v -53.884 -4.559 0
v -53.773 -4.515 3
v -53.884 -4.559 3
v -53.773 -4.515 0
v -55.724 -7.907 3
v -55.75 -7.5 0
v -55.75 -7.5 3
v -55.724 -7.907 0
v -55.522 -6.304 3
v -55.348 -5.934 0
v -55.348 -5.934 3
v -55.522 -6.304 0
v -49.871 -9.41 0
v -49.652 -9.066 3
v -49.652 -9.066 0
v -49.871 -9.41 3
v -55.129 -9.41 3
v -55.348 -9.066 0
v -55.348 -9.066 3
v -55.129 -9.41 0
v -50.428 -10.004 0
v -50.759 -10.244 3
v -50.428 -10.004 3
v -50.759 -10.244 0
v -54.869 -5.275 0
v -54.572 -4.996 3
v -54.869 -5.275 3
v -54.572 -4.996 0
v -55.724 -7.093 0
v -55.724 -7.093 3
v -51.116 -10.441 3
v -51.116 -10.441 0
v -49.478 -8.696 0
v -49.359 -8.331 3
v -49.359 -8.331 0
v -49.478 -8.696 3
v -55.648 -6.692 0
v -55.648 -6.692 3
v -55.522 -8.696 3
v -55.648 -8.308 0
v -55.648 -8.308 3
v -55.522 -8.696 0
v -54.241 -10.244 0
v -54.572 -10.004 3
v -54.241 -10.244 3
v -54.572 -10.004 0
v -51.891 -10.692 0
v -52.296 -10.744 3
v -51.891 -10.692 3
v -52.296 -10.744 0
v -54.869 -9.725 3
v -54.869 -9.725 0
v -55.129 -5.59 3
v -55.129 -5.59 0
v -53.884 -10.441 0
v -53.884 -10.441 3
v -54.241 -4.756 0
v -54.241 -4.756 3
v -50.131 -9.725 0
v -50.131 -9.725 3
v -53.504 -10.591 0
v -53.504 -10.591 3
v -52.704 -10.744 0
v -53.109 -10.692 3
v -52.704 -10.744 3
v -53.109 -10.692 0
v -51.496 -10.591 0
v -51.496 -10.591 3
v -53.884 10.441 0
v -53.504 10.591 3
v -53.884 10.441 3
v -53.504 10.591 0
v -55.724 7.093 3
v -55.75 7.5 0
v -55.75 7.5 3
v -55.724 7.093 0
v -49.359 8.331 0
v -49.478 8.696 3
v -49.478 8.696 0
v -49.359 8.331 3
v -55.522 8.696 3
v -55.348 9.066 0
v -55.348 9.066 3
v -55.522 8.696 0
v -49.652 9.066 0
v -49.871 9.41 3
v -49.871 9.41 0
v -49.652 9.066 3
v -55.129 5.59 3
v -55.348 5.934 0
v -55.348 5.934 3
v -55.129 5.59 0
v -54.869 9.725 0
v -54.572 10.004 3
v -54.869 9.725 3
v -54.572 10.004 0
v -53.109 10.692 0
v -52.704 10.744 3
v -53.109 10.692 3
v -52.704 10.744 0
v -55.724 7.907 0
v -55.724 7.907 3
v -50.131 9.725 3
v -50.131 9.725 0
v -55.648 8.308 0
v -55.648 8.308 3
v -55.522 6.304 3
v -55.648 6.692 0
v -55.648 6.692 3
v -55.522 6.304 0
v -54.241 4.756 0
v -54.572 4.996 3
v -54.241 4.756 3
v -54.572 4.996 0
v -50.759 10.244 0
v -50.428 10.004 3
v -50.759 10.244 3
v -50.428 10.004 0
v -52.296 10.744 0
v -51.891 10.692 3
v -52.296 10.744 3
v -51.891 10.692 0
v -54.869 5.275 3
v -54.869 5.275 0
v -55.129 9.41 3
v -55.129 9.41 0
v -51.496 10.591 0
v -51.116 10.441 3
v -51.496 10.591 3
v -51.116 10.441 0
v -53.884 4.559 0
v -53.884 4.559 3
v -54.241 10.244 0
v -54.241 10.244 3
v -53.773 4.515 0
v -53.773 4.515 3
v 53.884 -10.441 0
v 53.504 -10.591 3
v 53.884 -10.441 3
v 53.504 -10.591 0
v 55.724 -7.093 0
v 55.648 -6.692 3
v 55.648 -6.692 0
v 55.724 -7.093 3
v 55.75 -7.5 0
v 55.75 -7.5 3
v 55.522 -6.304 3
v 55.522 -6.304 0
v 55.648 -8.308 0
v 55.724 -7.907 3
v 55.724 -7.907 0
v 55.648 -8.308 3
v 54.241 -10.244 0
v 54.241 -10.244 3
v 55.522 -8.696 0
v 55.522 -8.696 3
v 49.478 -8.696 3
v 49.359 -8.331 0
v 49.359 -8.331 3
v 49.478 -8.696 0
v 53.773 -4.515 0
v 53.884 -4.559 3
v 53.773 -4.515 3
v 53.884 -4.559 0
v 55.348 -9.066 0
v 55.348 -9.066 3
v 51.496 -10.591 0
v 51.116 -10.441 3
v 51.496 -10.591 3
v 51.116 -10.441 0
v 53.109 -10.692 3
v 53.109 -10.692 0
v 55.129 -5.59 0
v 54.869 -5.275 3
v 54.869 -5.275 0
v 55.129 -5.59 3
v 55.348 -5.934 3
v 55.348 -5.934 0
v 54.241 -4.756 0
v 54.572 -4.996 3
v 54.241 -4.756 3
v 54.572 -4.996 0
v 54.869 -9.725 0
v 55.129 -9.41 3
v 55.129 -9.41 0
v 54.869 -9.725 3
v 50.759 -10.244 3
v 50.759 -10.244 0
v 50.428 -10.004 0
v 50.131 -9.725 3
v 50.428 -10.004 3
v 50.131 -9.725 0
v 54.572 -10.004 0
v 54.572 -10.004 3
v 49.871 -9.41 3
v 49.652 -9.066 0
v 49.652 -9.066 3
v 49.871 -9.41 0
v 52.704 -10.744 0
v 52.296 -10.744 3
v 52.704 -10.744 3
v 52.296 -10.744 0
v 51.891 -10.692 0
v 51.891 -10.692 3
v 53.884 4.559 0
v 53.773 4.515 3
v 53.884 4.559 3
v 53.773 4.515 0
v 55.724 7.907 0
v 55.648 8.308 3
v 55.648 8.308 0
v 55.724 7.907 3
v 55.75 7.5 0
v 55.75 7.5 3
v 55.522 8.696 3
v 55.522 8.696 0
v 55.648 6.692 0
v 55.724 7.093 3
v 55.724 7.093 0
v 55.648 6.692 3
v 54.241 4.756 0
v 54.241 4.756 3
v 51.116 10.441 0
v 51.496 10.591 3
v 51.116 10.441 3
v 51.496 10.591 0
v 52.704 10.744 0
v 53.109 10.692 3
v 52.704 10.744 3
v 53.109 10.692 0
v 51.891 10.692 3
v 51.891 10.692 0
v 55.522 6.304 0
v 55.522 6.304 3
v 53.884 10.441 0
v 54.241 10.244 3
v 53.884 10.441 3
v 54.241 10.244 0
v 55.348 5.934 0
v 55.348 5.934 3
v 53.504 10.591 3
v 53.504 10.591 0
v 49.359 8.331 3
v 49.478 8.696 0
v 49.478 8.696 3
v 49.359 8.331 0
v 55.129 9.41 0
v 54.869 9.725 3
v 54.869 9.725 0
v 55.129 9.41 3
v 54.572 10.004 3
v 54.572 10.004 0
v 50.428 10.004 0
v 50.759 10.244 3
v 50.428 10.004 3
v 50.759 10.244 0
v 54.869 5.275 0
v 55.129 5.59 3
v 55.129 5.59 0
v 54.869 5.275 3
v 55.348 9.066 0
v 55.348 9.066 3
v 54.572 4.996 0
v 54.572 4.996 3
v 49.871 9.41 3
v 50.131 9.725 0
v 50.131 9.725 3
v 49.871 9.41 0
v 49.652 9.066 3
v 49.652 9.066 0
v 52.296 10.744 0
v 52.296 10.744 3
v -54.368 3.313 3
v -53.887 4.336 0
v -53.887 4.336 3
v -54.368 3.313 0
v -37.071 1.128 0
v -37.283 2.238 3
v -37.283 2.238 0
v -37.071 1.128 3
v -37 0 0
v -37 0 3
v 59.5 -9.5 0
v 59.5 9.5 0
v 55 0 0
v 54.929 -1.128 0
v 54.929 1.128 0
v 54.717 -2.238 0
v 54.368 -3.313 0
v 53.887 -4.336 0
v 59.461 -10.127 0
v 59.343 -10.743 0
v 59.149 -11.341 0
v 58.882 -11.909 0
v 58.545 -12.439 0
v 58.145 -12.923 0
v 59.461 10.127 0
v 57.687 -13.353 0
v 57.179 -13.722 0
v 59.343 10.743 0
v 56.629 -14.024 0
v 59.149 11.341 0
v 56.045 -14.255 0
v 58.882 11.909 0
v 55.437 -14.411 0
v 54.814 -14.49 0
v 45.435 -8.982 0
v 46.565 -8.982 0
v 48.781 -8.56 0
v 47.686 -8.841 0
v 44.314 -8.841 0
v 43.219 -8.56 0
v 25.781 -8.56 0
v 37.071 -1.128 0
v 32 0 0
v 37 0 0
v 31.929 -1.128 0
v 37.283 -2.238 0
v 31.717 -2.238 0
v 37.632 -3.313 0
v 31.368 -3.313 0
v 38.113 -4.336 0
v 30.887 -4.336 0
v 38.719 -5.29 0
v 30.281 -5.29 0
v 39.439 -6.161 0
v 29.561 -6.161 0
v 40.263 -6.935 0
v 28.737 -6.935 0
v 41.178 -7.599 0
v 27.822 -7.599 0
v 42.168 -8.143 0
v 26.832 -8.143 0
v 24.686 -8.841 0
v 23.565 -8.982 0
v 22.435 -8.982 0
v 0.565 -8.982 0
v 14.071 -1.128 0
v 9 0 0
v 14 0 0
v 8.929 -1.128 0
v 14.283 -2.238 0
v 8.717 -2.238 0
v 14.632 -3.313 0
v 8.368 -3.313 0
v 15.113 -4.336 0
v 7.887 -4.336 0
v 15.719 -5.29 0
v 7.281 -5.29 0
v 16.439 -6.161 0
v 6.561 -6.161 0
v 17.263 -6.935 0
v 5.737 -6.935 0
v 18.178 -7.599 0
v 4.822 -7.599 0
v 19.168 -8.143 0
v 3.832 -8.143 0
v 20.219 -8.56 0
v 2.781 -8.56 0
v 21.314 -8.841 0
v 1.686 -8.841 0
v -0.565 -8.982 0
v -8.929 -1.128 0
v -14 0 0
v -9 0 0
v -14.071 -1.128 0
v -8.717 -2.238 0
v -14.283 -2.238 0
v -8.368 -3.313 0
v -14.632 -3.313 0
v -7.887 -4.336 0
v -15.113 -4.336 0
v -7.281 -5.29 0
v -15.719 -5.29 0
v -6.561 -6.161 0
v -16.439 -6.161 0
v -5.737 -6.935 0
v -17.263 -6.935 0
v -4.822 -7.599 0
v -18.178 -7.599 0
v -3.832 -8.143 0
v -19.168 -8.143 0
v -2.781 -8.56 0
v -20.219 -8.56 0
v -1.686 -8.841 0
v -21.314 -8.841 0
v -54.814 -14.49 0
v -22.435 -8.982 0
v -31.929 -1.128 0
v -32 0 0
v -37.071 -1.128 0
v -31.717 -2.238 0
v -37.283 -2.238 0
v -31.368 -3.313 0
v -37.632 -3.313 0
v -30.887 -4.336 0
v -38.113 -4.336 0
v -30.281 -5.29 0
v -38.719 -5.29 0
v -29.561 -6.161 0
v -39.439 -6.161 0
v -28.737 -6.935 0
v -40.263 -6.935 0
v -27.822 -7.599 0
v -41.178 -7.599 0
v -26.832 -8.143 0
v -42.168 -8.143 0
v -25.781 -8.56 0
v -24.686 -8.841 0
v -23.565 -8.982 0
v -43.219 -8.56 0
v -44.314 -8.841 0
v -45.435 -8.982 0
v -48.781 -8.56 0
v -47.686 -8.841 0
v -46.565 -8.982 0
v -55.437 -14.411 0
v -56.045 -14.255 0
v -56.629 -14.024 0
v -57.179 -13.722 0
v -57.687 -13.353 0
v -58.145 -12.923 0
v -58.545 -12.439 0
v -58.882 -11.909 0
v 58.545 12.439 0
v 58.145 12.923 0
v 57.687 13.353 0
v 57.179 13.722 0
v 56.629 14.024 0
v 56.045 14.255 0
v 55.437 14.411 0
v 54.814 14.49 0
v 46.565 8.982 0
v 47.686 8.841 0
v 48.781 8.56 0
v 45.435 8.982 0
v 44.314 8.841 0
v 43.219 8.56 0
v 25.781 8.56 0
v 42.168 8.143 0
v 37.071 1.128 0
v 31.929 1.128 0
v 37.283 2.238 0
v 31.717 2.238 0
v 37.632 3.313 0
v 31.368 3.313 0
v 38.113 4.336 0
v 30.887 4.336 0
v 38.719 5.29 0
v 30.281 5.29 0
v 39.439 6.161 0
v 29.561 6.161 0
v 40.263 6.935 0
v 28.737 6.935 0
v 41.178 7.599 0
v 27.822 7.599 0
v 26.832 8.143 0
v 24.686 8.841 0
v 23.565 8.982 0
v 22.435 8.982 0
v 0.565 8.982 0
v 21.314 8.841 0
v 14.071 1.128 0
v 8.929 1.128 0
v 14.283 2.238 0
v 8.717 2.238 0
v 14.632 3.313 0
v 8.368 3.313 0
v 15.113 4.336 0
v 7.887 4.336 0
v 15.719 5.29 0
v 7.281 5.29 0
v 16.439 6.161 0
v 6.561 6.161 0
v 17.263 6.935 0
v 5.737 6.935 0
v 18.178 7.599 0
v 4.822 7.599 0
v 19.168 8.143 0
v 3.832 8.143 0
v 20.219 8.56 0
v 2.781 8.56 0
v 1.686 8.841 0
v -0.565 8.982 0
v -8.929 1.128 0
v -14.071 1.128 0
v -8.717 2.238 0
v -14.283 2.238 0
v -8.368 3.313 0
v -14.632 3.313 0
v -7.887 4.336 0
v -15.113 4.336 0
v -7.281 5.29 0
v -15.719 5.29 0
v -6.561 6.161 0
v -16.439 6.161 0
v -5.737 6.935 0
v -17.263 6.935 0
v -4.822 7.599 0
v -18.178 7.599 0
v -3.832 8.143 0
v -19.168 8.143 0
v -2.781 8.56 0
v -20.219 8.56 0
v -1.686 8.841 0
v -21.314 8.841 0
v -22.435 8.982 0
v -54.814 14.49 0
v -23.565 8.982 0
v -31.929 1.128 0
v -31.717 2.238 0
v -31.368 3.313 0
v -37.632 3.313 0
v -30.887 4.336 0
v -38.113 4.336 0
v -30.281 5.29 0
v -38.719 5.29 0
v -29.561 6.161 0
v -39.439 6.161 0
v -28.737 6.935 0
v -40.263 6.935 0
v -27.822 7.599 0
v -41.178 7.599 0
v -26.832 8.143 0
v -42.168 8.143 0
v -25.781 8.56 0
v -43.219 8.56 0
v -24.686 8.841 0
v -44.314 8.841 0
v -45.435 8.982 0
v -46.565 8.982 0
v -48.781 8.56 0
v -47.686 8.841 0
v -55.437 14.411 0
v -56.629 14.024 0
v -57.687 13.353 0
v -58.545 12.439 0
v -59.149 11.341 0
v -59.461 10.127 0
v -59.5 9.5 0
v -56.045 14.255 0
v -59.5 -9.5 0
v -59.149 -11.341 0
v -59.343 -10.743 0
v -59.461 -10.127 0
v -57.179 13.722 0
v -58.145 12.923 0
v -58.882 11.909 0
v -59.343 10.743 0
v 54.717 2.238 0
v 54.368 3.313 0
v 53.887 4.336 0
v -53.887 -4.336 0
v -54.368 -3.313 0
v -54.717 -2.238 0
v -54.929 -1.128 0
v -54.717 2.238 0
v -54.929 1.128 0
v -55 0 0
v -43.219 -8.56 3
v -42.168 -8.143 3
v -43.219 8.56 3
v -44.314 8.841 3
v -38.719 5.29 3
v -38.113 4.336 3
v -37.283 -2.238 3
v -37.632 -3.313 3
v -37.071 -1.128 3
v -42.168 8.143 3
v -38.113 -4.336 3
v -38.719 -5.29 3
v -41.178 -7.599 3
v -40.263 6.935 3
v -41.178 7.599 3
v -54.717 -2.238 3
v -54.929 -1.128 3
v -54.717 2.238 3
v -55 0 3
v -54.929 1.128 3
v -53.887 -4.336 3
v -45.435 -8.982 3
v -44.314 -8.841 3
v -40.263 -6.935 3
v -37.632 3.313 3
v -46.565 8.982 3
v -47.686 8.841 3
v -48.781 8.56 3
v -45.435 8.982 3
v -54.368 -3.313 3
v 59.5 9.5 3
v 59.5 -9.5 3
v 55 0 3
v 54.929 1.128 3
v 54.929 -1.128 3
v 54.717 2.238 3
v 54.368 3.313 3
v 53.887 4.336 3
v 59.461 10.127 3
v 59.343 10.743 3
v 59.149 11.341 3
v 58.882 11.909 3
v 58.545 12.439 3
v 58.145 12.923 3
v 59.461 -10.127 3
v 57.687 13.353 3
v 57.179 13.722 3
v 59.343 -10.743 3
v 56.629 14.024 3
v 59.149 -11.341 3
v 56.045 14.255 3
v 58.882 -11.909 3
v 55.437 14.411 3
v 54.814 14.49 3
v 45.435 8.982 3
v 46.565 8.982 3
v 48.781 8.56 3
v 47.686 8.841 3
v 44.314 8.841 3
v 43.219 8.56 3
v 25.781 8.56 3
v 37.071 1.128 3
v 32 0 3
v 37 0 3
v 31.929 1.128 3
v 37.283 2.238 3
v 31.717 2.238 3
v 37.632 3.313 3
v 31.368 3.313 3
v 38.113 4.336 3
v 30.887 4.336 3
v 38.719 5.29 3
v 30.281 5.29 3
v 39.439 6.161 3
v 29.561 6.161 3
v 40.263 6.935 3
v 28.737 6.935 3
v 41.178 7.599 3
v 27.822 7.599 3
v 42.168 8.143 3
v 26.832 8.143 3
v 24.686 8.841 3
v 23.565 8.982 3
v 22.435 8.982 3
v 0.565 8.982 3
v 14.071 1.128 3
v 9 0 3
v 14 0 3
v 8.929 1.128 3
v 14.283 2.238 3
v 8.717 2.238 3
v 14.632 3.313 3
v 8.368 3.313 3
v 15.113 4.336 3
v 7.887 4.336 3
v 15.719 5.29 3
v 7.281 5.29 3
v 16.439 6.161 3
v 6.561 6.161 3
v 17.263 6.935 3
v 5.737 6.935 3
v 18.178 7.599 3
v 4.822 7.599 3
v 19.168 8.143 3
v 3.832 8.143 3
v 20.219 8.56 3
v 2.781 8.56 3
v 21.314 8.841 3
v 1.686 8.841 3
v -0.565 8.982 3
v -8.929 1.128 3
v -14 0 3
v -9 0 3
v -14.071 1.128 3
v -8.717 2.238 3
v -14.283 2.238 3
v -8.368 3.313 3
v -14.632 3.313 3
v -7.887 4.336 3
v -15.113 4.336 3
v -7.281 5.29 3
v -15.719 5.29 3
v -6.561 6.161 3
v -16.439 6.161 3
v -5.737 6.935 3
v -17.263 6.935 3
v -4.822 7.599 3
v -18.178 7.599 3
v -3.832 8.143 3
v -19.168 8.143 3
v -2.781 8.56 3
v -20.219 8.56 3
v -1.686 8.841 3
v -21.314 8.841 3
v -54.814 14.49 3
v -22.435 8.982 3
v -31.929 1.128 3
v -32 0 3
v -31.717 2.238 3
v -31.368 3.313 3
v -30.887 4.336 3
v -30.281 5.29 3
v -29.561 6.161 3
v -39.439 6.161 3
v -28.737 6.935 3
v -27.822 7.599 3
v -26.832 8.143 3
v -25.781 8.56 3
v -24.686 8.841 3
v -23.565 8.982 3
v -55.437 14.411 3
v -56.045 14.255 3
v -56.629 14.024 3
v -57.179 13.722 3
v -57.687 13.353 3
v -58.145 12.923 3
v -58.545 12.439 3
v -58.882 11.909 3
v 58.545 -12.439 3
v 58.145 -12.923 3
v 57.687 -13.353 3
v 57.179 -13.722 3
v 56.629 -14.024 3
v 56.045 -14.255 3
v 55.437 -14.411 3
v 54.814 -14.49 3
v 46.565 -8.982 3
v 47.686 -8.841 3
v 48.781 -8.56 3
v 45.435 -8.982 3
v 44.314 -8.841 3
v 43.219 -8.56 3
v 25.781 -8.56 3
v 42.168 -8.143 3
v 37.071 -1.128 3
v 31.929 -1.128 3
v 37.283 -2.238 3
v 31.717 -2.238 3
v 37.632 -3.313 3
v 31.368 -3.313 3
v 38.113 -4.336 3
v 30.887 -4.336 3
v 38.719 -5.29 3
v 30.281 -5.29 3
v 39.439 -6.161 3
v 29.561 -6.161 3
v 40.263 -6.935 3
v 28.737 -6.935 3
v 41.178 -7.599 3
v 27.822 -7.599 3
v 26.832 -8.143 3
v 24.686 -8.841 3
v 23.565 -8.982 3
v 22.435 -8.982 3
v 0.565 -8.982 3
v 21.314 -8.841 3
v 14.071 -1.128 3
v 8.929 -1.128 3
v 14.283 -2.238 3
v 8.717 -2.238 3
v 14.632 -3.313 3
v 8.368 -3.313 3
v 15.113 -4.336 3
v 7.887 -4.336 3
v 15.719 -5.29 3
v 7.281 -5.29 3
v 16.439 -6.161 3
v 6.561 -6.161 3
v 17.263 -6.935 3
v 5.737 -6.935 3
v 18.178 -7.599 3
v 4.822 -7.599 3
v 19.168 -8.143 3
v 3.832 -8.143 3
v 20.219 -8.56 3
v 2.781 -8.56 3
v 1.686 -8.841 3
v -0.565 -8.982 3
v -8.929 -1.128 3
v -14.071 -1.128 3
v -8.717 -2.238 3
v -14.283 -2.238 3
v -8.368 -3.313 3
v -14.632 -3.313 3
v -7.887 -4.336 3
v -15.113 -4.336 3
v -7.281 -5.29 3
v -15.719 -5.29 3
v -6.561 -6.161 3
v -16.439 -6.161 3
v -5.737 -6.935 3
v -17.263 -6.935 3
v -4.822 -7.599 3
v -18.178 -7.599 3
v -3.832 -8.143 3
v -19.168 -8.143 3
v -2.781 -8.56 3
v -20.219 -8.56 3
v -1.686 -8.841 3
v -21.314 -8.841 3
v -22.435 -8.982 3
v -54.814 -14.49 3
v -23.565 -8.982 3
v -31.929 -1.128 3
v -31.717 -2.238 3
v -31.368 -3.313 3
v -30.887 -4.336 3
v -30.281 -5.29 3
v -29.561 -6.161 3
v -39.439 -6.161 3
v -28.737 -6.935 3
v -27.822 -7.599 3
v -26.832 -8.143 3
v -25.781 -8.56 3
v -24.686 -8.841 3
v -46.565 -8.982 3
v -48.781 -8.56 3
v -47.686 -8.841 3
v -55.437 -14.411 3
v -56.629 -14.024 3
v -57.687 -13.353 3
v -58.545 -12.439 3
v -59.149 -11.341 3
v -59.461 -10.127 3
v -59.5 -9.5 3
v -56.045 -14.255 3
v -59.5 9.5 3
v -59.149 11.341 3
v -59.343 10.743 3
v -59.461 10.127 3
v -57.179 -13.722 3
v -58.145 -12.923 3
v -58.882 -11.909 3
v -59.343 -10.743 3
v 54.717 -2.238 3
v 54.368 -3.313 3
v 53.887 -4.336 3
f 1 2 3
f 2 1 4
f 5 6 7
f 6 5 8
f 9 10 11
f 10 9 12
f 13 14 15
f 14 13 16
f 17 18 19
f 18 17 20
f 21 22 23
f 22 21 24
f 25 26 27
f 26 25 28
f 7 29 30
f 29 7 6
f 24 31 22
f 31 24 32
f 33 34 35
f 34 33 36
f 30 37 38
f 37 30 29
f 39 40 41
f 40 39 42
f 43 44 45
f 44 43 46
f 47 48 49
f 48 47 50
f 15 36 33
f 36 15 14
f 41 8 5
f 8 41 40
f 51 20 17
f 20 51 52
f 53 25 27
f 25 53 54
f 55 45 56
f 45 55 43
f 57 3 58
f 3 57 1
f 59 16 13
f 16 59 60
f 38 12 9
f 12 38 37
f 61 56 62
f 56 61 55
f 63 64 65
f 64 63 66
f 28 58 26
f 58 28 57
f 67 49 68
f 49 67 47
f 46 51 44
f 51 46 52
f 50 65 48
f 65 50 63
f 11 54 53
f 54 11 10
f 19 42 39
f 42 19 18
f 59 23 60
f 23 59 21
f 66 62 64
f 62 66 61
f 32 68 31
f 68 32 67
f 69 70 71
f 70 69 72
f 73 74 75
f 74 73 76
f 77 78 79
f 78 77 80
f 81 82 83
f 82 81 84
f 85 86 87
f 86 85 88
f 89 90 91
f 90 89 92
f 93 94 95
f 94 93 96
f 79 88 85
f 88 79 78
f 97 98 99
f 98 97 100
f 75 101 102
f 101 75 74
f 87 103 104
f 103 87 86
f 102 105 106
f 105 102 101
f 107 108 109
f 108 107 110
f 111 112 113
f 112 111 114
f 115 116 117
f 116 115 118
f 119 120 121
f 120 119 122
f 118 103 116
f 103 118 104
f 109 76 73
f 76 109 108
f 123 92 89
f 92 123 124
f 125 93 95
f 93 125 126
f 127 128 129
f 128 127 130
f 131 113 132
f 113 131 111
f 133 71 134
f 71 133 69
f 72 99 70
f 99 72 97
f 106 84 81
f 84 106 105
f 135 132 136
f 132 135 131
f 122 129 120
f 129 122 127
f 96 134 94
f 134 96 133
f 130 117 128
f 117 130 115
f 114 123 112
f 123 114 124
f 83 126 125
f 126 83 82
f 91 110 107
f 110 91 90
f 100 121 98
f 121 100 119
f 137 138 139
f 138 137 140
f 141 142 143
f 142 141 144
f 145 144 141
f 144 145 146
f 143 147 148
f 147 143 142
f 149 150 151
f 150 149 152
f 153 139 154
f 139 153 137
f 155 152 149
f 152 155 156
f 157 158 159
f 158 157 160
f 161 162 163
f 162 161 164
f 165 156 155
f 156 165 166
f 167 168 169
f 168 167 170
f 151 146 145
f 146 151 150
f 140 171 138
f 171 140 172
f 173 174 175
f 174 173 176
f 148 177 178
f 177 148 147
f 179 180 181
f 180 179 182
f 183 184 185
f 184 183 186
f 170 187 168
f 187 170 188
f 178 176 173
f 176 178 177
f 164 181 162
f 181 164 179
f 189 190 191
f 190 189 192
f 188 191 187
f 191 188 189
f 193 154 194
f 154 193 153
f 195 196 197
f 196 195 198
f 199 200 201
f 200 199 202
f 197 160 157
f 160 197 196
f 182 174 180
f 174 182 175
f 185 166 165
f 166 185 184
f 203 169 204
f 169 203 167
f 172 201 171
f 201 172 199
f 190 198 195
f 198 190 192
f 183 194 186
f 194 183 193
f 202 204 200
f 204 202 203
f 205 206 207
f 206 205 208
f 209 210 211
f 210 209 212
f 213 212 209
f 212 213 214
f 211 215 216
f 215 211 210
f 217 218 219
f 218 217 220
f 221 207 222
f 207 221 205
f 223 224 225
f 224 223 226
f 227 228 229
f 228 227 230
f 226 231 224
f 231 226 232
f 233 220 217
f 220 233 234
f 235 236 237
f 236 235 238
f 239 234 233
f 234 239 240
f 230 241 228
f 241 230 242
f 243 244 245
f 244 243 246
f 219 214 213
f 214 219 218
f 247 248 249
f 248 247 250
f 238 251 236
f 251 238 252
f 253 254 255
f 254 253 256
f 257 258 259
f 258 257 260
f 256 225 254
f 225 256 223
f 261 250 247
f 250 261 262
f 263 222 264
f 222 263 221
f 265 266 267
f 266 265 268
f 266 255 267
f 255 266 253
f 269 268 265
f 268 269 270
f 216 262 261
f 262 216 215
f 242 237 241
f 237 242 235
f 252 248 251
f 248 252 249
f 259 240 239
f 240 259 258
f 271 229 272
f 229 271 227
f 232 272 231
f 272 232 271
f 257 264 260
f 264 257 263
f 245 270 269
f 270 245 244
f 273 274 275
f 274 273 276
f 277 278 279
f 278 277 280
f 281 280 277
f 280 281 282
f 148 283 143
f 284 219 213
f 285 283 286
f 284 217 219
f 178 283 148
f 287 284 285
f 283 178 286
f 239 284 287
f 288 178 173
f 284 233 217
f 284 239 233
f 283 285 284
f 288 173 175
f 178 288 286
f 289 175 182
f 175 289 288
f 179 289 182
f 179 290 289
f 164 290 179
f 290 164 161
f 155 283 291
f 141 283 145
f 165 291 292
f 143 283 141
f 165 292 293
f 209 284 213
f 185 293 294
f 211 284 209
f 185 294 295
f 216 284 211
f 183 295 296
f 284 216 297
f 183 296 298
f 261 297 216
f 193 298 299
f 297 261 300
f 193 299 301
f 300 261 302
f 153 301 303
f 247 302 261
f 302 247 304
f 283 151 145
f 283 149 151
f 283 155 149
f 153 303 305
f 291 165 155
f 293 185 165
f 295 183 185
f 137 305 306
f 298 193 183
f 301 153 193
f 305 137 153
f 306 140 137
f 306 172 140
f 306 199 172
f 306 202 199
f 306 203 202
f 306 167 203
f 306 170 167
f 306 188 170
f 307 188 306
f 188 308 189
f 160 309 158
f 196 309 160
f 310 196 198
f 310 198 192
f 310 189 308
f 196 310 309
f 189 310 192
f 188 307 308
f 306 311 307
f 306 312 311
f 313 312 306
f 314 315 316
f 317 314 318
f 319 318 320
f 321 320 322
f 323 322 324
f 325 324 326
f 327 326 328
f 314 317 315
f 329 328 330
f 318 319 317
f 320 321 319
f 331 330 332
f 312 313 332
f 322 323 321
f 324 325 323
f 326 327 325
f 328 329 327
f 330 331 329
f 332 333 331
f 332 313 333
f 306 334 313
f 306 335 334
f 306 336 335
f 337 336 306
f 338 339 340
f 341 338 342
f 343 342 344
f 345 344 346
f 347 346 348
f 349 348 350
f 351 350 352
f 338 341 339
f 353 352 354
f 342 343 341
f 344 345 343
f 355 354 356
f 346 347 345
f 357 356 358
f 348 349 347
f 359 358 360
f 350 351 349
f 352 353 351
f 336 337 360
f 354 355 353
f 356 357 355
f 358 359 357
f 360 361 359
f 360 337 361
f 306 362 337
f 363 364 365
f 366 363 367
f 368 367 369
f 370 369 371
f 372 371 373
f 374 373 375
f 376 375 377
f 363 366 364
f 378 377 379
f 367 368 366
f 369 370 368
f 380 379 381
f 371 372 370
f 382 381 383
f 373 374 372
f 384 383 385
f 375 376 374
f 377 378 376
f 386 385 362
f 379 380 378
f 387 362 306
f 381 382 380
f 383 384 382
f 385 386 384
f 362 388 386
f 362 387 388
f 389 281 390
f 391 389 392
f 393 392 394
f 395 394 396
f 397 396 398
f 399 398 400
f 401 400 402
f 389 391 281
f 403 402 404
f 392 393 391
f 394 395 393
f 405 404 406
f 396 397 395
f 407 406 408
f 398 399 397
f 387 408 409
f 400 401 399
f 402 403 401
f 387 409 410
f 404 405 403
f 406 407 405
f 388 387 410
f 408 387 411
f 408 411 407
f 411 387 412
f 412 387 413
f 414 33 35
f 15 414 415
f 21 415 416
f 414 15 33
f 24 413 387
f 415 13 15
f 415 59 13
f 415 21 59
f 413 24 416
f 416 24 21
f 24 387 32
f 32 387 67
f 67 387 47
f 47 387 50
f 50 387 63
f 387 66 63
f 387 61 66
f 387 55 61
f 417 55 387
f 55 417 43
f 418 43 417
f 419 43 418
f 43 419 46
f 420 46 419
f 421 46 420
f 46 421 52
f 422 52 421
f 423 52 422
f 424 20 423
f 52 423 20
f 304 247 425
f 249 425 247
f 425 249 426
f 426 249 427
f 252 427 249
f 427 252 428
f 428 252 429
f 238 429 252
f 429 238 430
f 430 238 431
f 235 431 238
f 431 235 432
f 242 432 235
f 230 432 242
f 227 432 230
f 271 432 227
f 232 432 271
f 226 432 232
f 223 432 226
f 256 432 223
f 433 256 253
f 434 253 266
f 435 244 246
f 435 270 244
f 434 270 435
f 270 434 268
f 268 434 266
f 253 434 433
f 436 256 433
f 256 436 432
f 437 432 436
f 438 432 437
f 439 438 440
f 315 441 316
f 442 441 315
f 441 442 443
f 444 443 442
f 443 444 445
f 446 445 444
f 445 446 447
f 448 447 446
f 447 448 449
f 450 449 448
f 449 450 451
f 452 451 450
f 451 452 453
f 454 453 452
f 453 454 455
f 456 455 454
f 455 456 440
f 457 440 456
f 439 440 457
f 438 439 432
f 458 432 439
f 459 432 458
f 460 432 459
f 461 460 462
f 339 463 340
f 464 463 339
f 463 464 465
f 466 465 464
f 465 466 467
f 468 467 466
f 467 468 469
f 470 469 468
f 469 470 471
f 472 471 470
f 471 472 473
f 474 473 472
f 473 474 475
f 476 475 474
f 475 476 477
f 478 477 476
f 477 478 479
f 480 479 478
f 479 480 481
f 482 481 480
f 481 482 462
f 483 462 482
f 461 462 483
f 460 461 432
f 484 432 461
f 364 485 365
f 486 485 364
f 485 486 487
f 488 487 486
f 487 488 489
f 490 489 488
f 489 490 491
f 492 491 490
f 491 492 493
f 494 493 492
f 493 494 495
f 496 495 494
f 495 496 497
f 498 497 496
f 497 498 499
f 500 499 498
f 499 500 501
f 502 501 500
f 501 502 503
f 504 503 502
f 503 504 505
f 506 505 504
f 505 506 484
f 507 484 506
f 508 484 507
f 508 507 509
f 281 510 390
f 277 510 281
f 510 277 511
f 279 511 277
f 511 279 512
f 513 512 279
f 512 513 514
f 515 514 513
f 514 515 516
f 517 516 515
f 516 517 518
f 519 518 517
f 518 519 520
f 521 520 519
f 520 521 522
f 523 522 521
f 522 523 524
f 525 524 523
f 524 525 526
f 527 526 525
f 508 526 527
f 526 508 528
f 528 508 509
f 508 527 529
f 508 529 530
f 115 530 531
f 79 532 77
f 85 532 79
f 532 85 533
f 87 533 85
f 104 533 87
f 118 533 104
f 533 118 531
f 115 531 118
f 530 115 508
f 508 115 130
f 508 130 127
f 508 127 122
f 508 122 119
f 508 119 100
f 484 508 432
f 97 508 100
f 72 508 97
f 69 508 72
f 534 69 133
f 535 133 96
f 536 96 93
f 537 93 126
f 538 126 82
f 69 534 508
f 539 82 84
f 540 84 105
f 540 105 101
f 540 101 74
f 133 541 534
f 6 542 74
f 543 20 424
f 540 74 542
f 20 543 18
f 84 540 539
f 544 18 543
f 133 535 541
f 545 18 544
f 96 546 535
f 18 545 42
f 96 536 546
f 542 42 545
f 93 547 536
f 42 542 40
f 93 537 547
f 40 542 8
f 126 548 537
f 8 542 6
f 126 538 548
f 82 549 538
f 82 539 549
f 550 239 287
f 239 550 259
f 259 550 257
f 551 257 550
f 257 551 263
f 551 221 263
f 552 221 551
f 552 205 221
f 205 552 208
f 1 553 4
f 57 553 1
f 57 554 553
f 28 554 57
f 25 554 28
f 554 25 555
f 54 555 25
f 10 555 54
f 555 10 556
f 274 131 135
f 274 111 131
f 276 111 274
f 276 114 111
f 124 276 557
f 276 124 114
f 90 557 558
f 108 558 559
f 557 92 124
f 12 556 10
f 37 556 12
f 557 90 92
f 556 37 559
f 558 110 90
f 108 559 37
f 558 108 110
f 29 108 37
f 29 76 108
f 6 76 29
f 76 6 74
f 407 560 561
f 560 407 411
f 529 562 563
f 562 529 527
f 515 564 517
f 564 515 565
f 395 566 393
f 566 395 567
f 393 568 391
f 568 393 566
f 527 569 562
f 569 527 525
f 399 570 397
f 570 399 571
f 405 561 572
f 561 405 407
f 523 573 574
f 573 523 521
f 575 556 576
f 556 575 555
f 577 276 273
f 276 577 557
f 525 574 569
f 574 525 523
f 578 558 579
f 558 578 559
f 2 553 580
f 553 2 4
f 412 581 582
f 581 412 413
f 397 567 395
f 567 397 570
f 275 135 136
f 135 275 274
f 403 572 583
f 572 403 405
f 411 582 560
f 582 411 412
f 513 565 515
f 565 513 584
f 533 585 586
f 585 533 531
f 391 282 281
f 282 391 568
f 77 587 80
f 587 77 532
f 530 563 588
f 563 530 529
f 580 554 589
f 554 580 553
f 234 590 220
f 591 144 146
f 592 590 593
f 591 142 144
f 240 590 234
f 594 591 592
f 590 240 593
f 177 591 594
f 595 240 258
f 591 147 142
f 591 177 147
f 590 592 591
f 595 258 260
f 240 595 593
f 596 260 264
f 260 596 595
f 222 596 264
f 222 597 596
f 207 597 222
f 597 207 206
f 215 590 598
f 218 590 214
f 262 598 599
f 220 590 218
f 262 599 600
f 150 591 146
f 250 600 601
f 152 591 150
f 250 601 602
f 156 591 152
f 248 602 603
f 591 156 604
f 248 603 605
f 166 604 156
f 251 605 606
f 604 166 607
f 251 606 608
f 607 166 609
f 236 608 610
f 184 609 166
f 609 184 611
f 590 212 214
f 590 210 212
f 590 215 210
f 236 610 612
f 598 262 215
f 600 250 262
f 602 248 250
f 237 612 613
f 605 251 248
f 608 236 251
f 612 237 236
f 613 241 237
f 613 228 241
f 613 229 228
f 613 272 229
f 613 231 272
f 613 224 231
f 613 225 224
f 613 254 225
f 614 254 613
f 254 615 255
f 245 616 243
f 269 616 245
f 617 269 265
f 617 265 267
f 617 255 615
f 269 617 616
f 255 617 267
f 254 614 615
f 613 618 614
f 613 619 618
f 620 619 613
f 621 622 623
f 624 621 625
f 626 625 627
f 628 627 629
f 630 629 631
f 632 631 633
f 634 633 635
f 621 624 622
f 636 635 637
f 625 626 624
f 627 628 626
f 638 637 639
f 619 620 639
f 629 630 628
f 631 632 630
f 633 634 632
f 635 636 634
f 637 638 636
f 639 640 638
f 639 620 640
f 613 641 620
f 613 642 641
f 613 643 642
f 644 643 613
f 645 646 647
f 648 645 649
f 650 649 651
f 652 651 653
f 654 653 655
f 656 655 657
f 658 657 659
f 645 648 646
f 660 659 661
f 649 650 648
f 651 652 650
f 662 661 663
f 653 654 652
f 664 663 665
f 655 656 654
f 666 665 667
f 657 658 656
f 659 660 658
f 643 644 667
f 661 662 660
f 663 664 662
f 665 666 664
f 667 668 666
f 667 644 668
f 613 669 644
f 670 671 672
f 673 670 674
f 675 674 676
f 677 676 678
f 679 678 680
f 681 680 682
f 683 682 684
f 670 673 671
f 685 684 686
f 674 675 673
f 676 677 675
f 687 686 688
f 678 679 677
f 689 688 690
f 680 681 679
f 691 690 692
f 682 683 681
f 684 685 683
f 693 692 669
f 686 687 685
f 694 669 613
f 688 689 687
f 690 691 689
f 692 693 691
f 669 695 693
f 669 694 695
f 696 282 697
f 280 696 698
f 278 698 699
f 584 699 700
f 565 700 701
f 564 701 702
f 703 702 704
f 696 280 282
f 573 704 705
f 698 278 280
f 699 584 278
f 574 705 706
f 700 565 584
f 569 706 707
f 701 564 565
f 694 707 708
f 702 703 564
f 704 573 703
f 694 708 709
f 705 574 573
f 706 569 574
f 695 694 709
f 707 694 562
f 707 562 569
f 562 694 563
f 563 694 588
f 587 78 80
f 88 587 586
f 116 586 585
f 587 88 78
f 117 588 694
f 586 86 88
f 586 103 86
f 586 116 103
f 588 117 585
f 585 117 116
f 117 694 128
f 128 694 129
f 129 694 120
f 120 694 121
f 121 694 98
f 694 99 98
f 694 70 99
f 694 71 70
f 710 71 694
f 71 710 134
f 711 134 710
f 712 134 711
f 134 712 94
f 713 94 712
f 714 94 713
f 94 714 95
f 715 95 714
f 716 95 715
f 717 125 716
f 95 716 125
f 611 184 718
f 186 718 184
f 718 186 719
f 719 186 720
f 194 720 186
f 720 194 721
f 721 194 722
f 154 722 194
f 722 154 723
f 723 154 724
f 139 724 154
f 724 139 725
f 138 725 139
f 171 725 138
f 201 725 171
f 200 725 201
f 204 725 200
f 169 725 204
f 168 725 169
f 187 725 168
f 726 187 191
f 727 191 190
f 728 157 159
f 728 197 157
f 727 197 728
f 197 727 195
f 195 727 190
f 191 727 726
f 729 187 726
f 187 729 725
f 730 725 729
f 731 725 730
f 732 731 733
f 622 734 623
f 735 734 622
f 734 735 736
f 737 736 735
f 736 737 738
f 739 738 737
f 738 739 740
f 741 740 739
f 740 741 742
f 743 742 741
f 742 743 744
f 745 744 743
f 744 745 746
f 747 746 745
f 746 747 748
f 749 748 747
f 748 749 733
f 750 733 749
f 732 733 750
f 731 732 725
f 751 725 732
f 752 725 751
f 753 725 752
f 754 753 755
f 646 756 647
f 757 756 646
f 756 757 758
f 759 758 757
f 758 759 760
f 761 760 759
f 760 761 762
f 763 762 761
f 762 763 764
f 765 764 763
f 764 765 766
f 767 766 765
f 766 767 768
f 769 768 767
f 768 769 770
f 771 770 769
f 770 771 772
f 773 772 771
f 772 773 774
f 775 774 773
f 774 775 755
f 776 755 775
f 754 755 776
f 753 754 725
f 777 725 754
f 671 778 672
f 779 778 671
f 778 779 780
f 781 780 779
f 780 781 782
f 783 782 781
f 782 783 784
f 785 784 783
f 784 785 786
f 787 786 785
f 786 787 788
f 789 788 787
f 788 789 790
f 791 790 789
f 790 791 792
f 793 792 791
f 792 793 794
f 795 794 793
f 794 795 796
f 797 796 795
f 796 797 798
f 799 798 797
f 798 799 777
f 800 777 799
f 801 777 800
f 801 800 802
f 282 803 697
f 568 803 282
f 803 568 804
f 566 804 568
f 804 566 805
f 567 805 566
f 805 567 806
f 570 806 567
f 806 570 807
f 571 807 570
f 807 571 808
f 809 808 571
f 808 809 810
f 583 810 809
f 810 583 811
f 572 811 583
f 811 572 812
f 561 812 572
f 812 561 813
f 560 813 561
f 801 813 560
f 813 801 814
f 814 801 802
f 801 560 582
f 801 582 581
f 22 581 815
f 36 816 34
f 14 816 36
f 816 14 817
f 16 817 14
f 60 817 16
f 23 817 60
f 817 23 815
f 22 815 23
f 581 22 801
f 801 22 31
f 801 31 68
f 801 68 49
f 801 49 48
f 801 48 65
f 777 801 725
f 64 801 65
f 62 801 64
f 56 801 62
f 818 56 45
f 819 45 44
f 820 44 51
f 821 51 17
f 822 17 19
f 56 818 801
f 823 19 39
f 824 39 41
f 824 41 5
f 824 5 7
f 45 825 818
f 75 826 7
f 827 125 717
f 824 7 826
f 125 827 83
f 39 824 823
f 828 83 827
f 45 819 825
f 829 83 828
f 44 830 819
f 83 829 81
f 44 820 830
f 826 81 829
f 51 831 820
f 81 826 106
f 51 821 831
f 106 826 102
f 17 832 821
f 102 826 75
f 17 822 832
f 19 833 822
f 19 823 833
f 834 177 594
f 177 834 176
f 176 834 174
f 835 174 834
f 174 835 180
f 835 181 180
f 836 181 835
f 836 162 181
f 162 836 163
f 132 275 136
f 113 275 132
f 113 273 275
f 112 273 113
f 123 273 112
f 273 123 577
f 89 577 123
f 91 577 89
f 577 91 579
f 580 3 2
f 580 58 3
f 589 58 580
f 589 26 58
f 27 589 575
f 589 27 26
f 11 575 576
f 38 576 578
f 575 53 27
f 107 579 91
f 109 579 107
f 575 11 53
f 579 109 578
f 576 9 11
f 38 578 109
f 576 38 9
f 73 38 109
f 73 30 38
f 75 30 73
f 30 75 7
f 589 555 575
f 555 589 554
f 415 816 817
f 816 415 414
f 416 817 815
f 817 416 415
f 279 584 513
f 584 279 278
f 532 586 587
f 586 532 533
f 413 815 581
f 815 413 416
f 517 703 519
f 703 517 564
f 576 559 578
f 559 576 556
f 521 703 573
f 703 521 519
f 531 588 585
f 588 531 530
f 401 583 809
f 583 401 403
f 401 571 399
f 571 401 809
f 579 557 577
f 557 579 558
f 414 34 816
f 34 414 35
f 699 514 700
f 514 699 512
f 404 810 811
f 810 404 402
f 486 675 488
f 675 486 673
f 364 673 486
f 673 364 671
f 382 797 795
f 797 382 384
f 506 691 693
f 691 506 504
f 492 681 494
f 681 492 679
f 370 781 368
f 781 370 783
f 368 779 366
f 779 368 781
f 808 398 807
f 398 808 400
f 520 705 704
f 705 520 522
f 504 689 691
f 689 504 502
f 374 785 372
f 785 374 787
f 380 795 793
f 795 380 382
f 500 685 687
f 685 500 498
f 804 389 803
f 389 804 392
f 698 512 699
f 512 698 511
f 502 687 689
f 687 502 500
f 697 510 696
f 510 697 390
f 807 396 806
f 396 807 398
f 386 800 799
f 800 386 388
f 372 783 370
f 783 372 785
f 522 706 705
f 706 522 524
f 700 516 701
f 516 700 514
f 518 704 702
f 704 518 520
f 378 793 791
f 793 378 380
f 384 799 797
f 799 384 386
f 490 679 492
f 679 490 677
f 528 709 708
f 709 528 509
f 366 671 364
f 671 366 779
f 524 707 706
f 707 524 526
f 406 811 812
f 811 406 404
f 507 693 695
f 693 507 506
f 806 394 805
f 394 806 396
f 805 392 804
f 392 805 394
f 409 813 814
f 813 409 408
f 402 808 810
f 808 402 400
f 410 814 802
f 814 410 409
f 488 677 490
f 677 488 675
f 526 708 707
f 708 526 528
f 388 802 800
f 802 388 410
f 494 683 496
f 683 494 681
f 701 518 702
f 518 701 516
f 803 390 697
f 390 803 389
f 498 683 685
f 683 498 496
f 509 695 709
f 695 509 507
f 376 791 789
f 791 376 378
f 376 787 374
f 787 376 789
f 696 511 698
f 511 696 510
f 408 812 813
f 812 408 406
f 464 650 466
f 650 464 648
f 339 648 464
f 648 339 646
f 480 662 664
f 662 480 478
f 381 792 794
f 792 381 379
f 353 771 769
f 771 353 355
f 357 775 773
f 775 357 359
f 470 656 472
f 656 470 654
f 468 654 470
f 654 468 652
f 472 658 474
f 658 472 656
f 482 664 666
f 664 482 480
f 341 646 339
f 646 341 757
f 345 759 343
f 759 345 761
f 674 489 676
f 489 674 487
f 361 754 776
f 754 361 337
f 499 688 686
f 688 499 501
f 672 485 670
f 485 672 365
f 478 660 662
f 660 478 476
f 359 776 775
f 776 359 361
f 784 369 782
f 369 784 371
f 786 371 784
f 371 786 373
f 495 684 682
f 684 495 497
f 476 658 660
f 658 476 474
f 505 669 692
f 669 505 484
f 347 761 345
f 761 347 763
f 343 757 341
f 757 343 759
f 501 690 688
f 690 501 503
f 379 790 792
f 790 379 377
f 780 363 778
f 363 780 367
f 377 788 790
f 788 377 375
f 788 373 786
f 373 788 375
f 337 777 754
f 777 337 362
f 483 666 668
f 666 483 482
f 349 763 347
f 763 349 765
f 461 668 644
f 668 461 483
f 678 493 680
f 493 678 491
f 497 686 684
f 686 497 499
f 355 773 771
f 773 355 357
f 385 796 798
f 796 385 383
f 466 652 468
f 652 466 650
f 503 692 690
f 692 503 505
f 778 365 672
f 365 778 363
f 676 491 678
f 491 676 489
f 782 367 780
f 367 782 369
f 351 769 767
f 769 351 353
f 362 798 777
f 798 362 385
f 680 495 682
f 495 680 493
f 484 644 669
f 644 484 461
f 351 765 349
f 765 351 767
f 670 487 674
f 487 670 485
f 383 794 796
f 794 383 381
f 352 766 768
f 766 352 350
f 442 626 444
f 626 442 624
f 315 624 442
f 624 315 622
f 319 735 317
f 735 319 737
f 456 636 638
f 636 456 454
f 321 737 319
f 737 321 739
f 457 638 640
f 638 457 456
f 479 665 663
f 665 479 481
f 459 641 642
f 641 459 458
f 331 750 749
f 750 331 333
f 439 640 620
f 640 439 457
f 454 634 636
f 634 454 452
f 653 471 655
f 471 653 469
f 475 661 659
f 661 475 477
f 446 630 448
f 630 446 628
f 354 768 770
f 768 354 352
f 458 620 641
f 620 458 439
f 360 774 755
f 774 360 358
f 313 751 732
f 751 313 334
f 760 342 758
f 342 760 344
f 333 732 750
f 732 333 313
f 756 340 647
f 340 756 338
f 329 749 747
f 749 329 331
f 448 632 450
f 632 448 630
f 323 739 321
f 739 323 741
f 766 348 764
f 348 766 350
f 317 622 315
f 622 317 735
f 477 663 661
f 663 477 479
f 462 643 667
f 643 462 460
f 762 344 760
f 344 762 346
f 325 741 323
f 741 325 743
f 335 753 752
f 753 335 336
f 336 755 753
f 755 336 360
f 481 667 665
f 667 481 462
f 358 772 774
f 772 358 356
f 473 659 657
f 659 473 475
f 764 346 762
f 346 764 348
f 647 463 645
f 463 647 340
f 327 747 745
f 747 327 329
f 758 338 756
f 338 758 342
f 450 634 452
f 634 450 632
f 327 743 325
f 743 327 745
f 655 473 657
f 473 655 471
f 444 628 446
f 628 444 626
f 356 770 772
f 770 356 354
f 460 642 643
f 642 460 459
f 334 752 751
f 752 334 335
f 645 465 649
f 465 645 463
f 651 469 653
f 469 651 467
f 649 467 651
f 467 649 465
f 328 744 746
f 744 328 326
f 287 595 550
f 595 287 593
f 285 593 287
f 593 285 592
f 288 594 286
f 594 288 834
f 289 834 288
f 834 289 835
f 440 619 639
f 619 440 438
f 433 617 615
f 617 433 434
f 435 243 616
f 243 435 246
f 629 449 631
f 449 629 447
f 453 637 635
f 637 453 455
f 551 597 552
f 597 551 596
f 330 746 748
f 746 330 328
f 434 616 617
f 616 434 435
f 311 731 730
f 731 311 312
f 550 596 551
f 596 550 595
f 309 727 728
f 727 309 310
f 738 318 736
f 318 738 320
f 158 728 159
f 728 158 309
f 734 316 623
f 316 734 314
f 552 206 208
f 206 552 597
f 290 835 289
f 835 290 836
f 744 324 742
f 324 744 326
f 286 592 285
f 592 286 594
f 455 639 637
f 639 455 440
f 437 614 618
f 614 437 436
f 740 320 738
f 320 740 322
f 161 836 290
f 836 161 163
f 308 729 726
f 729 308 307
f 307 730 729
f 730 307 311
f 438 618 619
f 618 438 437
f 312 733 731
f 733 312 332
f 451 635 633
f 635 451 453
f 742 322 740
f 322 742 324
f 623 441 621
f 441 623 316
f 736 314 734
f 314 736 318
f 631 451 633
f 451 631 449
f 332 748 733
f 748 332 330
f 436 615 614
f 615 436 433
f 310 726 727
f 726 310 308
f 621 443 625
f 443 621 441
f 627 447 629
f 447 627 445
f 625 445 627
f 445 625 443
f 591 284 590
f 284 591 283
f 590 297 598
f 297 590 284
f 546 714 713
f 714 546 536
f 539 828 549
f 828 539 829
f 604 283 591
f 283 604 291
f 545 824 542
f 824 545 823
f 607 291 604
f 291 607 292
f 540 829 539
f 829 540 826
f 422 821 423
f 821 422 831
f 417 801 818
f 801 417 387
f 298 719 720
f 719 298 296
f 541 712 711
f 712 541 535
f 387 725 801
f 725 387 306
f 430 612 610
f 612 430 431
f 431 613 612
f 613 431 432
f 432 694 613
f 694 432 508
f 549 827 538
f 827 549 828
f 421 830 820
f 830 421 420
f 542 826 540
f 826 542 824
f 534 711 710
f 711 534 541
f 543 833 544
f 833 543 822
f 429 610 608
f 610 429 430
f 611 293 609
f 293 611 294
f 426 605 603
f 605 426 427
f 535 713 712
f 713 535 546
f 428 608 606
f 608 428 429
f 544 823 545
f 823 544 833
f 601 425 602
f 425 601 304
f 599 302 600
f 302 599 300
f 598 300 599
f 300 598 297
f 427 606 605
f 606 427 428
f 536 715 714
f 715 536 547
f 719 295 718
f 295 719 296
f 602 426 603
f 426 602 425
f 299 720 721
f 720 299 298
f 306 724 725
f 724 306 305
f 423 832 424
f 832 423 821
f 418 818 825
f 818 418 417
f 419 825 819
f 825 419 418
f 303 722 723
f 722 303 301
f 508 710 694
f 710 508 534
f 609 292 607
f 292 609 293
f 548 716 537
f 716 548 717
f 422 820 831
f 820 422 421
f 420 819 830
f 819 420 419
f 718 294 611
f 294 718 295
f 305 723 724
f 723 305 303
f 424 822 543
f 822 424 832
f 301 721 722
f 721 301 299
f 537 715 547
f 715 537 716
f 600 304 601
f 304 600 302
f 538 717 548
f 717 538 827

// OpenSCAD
$fn = 50;


difference() {
	union() {
		hull() {
			translate(v = [-54.5000000000, 9.5000000000, 0]) {
				cylinder(h = 3, r = 5);
			}
			translate(v = [54.5000000000, 9.5000000000, 0]) {
				cylinder(h = 3, r = 5);
			}
			translate(v = [-54.5000000000, -9.5000000000, 0]) {
				cylinder(h = 3, r = 5);
			}
			translate(v = [54.5000000000, -9.5000000000, 0]) {
				cylinder(h = 3, r = 5);
			}
		}
	}
	union() {
		#translate(v = [-52.5000000000, -7.5000000000, -100.0000000000]) {
			cylinder(h = 200, r = 3.2500000000);
		}
		#translate(v = [-52.5000000000, 7.5000000000, -100.0000000000]) {
			cylinder(h = 200, r = 3.2500000000);
		}
		#translate(v = [52.5000000000, -7.5000000000, -100.0000000000]) {
			cylinder(h = 200, r = 3.2500000000);
		}
		#translate(v = [52.5000000000, 7.5000000000, -100.0000000000]) {
			cylinder(h = 200, r = 3.2500000000);
		}
		#translate(v = [-46.0000000000, 0, 0]) {
			cylinder(h = 3, r = 9.0000000000);
		}
		#translate(v = [-23.0000000000, 0, 0]) {
			cylinder(h = 3, r = 9.0000000000);
		}
		#cylinder(h = 3, r = 9.0000000000);
		#translate(v = [23.0000000000, 0, 0]) {
			cylinder(h = 3, r = 9.0000000000);
		}
		#translate(v = [46.0000000000, 0, 0]) {
			cylinder(h = 3, r = 9.0000000000);
		}
	}
}
